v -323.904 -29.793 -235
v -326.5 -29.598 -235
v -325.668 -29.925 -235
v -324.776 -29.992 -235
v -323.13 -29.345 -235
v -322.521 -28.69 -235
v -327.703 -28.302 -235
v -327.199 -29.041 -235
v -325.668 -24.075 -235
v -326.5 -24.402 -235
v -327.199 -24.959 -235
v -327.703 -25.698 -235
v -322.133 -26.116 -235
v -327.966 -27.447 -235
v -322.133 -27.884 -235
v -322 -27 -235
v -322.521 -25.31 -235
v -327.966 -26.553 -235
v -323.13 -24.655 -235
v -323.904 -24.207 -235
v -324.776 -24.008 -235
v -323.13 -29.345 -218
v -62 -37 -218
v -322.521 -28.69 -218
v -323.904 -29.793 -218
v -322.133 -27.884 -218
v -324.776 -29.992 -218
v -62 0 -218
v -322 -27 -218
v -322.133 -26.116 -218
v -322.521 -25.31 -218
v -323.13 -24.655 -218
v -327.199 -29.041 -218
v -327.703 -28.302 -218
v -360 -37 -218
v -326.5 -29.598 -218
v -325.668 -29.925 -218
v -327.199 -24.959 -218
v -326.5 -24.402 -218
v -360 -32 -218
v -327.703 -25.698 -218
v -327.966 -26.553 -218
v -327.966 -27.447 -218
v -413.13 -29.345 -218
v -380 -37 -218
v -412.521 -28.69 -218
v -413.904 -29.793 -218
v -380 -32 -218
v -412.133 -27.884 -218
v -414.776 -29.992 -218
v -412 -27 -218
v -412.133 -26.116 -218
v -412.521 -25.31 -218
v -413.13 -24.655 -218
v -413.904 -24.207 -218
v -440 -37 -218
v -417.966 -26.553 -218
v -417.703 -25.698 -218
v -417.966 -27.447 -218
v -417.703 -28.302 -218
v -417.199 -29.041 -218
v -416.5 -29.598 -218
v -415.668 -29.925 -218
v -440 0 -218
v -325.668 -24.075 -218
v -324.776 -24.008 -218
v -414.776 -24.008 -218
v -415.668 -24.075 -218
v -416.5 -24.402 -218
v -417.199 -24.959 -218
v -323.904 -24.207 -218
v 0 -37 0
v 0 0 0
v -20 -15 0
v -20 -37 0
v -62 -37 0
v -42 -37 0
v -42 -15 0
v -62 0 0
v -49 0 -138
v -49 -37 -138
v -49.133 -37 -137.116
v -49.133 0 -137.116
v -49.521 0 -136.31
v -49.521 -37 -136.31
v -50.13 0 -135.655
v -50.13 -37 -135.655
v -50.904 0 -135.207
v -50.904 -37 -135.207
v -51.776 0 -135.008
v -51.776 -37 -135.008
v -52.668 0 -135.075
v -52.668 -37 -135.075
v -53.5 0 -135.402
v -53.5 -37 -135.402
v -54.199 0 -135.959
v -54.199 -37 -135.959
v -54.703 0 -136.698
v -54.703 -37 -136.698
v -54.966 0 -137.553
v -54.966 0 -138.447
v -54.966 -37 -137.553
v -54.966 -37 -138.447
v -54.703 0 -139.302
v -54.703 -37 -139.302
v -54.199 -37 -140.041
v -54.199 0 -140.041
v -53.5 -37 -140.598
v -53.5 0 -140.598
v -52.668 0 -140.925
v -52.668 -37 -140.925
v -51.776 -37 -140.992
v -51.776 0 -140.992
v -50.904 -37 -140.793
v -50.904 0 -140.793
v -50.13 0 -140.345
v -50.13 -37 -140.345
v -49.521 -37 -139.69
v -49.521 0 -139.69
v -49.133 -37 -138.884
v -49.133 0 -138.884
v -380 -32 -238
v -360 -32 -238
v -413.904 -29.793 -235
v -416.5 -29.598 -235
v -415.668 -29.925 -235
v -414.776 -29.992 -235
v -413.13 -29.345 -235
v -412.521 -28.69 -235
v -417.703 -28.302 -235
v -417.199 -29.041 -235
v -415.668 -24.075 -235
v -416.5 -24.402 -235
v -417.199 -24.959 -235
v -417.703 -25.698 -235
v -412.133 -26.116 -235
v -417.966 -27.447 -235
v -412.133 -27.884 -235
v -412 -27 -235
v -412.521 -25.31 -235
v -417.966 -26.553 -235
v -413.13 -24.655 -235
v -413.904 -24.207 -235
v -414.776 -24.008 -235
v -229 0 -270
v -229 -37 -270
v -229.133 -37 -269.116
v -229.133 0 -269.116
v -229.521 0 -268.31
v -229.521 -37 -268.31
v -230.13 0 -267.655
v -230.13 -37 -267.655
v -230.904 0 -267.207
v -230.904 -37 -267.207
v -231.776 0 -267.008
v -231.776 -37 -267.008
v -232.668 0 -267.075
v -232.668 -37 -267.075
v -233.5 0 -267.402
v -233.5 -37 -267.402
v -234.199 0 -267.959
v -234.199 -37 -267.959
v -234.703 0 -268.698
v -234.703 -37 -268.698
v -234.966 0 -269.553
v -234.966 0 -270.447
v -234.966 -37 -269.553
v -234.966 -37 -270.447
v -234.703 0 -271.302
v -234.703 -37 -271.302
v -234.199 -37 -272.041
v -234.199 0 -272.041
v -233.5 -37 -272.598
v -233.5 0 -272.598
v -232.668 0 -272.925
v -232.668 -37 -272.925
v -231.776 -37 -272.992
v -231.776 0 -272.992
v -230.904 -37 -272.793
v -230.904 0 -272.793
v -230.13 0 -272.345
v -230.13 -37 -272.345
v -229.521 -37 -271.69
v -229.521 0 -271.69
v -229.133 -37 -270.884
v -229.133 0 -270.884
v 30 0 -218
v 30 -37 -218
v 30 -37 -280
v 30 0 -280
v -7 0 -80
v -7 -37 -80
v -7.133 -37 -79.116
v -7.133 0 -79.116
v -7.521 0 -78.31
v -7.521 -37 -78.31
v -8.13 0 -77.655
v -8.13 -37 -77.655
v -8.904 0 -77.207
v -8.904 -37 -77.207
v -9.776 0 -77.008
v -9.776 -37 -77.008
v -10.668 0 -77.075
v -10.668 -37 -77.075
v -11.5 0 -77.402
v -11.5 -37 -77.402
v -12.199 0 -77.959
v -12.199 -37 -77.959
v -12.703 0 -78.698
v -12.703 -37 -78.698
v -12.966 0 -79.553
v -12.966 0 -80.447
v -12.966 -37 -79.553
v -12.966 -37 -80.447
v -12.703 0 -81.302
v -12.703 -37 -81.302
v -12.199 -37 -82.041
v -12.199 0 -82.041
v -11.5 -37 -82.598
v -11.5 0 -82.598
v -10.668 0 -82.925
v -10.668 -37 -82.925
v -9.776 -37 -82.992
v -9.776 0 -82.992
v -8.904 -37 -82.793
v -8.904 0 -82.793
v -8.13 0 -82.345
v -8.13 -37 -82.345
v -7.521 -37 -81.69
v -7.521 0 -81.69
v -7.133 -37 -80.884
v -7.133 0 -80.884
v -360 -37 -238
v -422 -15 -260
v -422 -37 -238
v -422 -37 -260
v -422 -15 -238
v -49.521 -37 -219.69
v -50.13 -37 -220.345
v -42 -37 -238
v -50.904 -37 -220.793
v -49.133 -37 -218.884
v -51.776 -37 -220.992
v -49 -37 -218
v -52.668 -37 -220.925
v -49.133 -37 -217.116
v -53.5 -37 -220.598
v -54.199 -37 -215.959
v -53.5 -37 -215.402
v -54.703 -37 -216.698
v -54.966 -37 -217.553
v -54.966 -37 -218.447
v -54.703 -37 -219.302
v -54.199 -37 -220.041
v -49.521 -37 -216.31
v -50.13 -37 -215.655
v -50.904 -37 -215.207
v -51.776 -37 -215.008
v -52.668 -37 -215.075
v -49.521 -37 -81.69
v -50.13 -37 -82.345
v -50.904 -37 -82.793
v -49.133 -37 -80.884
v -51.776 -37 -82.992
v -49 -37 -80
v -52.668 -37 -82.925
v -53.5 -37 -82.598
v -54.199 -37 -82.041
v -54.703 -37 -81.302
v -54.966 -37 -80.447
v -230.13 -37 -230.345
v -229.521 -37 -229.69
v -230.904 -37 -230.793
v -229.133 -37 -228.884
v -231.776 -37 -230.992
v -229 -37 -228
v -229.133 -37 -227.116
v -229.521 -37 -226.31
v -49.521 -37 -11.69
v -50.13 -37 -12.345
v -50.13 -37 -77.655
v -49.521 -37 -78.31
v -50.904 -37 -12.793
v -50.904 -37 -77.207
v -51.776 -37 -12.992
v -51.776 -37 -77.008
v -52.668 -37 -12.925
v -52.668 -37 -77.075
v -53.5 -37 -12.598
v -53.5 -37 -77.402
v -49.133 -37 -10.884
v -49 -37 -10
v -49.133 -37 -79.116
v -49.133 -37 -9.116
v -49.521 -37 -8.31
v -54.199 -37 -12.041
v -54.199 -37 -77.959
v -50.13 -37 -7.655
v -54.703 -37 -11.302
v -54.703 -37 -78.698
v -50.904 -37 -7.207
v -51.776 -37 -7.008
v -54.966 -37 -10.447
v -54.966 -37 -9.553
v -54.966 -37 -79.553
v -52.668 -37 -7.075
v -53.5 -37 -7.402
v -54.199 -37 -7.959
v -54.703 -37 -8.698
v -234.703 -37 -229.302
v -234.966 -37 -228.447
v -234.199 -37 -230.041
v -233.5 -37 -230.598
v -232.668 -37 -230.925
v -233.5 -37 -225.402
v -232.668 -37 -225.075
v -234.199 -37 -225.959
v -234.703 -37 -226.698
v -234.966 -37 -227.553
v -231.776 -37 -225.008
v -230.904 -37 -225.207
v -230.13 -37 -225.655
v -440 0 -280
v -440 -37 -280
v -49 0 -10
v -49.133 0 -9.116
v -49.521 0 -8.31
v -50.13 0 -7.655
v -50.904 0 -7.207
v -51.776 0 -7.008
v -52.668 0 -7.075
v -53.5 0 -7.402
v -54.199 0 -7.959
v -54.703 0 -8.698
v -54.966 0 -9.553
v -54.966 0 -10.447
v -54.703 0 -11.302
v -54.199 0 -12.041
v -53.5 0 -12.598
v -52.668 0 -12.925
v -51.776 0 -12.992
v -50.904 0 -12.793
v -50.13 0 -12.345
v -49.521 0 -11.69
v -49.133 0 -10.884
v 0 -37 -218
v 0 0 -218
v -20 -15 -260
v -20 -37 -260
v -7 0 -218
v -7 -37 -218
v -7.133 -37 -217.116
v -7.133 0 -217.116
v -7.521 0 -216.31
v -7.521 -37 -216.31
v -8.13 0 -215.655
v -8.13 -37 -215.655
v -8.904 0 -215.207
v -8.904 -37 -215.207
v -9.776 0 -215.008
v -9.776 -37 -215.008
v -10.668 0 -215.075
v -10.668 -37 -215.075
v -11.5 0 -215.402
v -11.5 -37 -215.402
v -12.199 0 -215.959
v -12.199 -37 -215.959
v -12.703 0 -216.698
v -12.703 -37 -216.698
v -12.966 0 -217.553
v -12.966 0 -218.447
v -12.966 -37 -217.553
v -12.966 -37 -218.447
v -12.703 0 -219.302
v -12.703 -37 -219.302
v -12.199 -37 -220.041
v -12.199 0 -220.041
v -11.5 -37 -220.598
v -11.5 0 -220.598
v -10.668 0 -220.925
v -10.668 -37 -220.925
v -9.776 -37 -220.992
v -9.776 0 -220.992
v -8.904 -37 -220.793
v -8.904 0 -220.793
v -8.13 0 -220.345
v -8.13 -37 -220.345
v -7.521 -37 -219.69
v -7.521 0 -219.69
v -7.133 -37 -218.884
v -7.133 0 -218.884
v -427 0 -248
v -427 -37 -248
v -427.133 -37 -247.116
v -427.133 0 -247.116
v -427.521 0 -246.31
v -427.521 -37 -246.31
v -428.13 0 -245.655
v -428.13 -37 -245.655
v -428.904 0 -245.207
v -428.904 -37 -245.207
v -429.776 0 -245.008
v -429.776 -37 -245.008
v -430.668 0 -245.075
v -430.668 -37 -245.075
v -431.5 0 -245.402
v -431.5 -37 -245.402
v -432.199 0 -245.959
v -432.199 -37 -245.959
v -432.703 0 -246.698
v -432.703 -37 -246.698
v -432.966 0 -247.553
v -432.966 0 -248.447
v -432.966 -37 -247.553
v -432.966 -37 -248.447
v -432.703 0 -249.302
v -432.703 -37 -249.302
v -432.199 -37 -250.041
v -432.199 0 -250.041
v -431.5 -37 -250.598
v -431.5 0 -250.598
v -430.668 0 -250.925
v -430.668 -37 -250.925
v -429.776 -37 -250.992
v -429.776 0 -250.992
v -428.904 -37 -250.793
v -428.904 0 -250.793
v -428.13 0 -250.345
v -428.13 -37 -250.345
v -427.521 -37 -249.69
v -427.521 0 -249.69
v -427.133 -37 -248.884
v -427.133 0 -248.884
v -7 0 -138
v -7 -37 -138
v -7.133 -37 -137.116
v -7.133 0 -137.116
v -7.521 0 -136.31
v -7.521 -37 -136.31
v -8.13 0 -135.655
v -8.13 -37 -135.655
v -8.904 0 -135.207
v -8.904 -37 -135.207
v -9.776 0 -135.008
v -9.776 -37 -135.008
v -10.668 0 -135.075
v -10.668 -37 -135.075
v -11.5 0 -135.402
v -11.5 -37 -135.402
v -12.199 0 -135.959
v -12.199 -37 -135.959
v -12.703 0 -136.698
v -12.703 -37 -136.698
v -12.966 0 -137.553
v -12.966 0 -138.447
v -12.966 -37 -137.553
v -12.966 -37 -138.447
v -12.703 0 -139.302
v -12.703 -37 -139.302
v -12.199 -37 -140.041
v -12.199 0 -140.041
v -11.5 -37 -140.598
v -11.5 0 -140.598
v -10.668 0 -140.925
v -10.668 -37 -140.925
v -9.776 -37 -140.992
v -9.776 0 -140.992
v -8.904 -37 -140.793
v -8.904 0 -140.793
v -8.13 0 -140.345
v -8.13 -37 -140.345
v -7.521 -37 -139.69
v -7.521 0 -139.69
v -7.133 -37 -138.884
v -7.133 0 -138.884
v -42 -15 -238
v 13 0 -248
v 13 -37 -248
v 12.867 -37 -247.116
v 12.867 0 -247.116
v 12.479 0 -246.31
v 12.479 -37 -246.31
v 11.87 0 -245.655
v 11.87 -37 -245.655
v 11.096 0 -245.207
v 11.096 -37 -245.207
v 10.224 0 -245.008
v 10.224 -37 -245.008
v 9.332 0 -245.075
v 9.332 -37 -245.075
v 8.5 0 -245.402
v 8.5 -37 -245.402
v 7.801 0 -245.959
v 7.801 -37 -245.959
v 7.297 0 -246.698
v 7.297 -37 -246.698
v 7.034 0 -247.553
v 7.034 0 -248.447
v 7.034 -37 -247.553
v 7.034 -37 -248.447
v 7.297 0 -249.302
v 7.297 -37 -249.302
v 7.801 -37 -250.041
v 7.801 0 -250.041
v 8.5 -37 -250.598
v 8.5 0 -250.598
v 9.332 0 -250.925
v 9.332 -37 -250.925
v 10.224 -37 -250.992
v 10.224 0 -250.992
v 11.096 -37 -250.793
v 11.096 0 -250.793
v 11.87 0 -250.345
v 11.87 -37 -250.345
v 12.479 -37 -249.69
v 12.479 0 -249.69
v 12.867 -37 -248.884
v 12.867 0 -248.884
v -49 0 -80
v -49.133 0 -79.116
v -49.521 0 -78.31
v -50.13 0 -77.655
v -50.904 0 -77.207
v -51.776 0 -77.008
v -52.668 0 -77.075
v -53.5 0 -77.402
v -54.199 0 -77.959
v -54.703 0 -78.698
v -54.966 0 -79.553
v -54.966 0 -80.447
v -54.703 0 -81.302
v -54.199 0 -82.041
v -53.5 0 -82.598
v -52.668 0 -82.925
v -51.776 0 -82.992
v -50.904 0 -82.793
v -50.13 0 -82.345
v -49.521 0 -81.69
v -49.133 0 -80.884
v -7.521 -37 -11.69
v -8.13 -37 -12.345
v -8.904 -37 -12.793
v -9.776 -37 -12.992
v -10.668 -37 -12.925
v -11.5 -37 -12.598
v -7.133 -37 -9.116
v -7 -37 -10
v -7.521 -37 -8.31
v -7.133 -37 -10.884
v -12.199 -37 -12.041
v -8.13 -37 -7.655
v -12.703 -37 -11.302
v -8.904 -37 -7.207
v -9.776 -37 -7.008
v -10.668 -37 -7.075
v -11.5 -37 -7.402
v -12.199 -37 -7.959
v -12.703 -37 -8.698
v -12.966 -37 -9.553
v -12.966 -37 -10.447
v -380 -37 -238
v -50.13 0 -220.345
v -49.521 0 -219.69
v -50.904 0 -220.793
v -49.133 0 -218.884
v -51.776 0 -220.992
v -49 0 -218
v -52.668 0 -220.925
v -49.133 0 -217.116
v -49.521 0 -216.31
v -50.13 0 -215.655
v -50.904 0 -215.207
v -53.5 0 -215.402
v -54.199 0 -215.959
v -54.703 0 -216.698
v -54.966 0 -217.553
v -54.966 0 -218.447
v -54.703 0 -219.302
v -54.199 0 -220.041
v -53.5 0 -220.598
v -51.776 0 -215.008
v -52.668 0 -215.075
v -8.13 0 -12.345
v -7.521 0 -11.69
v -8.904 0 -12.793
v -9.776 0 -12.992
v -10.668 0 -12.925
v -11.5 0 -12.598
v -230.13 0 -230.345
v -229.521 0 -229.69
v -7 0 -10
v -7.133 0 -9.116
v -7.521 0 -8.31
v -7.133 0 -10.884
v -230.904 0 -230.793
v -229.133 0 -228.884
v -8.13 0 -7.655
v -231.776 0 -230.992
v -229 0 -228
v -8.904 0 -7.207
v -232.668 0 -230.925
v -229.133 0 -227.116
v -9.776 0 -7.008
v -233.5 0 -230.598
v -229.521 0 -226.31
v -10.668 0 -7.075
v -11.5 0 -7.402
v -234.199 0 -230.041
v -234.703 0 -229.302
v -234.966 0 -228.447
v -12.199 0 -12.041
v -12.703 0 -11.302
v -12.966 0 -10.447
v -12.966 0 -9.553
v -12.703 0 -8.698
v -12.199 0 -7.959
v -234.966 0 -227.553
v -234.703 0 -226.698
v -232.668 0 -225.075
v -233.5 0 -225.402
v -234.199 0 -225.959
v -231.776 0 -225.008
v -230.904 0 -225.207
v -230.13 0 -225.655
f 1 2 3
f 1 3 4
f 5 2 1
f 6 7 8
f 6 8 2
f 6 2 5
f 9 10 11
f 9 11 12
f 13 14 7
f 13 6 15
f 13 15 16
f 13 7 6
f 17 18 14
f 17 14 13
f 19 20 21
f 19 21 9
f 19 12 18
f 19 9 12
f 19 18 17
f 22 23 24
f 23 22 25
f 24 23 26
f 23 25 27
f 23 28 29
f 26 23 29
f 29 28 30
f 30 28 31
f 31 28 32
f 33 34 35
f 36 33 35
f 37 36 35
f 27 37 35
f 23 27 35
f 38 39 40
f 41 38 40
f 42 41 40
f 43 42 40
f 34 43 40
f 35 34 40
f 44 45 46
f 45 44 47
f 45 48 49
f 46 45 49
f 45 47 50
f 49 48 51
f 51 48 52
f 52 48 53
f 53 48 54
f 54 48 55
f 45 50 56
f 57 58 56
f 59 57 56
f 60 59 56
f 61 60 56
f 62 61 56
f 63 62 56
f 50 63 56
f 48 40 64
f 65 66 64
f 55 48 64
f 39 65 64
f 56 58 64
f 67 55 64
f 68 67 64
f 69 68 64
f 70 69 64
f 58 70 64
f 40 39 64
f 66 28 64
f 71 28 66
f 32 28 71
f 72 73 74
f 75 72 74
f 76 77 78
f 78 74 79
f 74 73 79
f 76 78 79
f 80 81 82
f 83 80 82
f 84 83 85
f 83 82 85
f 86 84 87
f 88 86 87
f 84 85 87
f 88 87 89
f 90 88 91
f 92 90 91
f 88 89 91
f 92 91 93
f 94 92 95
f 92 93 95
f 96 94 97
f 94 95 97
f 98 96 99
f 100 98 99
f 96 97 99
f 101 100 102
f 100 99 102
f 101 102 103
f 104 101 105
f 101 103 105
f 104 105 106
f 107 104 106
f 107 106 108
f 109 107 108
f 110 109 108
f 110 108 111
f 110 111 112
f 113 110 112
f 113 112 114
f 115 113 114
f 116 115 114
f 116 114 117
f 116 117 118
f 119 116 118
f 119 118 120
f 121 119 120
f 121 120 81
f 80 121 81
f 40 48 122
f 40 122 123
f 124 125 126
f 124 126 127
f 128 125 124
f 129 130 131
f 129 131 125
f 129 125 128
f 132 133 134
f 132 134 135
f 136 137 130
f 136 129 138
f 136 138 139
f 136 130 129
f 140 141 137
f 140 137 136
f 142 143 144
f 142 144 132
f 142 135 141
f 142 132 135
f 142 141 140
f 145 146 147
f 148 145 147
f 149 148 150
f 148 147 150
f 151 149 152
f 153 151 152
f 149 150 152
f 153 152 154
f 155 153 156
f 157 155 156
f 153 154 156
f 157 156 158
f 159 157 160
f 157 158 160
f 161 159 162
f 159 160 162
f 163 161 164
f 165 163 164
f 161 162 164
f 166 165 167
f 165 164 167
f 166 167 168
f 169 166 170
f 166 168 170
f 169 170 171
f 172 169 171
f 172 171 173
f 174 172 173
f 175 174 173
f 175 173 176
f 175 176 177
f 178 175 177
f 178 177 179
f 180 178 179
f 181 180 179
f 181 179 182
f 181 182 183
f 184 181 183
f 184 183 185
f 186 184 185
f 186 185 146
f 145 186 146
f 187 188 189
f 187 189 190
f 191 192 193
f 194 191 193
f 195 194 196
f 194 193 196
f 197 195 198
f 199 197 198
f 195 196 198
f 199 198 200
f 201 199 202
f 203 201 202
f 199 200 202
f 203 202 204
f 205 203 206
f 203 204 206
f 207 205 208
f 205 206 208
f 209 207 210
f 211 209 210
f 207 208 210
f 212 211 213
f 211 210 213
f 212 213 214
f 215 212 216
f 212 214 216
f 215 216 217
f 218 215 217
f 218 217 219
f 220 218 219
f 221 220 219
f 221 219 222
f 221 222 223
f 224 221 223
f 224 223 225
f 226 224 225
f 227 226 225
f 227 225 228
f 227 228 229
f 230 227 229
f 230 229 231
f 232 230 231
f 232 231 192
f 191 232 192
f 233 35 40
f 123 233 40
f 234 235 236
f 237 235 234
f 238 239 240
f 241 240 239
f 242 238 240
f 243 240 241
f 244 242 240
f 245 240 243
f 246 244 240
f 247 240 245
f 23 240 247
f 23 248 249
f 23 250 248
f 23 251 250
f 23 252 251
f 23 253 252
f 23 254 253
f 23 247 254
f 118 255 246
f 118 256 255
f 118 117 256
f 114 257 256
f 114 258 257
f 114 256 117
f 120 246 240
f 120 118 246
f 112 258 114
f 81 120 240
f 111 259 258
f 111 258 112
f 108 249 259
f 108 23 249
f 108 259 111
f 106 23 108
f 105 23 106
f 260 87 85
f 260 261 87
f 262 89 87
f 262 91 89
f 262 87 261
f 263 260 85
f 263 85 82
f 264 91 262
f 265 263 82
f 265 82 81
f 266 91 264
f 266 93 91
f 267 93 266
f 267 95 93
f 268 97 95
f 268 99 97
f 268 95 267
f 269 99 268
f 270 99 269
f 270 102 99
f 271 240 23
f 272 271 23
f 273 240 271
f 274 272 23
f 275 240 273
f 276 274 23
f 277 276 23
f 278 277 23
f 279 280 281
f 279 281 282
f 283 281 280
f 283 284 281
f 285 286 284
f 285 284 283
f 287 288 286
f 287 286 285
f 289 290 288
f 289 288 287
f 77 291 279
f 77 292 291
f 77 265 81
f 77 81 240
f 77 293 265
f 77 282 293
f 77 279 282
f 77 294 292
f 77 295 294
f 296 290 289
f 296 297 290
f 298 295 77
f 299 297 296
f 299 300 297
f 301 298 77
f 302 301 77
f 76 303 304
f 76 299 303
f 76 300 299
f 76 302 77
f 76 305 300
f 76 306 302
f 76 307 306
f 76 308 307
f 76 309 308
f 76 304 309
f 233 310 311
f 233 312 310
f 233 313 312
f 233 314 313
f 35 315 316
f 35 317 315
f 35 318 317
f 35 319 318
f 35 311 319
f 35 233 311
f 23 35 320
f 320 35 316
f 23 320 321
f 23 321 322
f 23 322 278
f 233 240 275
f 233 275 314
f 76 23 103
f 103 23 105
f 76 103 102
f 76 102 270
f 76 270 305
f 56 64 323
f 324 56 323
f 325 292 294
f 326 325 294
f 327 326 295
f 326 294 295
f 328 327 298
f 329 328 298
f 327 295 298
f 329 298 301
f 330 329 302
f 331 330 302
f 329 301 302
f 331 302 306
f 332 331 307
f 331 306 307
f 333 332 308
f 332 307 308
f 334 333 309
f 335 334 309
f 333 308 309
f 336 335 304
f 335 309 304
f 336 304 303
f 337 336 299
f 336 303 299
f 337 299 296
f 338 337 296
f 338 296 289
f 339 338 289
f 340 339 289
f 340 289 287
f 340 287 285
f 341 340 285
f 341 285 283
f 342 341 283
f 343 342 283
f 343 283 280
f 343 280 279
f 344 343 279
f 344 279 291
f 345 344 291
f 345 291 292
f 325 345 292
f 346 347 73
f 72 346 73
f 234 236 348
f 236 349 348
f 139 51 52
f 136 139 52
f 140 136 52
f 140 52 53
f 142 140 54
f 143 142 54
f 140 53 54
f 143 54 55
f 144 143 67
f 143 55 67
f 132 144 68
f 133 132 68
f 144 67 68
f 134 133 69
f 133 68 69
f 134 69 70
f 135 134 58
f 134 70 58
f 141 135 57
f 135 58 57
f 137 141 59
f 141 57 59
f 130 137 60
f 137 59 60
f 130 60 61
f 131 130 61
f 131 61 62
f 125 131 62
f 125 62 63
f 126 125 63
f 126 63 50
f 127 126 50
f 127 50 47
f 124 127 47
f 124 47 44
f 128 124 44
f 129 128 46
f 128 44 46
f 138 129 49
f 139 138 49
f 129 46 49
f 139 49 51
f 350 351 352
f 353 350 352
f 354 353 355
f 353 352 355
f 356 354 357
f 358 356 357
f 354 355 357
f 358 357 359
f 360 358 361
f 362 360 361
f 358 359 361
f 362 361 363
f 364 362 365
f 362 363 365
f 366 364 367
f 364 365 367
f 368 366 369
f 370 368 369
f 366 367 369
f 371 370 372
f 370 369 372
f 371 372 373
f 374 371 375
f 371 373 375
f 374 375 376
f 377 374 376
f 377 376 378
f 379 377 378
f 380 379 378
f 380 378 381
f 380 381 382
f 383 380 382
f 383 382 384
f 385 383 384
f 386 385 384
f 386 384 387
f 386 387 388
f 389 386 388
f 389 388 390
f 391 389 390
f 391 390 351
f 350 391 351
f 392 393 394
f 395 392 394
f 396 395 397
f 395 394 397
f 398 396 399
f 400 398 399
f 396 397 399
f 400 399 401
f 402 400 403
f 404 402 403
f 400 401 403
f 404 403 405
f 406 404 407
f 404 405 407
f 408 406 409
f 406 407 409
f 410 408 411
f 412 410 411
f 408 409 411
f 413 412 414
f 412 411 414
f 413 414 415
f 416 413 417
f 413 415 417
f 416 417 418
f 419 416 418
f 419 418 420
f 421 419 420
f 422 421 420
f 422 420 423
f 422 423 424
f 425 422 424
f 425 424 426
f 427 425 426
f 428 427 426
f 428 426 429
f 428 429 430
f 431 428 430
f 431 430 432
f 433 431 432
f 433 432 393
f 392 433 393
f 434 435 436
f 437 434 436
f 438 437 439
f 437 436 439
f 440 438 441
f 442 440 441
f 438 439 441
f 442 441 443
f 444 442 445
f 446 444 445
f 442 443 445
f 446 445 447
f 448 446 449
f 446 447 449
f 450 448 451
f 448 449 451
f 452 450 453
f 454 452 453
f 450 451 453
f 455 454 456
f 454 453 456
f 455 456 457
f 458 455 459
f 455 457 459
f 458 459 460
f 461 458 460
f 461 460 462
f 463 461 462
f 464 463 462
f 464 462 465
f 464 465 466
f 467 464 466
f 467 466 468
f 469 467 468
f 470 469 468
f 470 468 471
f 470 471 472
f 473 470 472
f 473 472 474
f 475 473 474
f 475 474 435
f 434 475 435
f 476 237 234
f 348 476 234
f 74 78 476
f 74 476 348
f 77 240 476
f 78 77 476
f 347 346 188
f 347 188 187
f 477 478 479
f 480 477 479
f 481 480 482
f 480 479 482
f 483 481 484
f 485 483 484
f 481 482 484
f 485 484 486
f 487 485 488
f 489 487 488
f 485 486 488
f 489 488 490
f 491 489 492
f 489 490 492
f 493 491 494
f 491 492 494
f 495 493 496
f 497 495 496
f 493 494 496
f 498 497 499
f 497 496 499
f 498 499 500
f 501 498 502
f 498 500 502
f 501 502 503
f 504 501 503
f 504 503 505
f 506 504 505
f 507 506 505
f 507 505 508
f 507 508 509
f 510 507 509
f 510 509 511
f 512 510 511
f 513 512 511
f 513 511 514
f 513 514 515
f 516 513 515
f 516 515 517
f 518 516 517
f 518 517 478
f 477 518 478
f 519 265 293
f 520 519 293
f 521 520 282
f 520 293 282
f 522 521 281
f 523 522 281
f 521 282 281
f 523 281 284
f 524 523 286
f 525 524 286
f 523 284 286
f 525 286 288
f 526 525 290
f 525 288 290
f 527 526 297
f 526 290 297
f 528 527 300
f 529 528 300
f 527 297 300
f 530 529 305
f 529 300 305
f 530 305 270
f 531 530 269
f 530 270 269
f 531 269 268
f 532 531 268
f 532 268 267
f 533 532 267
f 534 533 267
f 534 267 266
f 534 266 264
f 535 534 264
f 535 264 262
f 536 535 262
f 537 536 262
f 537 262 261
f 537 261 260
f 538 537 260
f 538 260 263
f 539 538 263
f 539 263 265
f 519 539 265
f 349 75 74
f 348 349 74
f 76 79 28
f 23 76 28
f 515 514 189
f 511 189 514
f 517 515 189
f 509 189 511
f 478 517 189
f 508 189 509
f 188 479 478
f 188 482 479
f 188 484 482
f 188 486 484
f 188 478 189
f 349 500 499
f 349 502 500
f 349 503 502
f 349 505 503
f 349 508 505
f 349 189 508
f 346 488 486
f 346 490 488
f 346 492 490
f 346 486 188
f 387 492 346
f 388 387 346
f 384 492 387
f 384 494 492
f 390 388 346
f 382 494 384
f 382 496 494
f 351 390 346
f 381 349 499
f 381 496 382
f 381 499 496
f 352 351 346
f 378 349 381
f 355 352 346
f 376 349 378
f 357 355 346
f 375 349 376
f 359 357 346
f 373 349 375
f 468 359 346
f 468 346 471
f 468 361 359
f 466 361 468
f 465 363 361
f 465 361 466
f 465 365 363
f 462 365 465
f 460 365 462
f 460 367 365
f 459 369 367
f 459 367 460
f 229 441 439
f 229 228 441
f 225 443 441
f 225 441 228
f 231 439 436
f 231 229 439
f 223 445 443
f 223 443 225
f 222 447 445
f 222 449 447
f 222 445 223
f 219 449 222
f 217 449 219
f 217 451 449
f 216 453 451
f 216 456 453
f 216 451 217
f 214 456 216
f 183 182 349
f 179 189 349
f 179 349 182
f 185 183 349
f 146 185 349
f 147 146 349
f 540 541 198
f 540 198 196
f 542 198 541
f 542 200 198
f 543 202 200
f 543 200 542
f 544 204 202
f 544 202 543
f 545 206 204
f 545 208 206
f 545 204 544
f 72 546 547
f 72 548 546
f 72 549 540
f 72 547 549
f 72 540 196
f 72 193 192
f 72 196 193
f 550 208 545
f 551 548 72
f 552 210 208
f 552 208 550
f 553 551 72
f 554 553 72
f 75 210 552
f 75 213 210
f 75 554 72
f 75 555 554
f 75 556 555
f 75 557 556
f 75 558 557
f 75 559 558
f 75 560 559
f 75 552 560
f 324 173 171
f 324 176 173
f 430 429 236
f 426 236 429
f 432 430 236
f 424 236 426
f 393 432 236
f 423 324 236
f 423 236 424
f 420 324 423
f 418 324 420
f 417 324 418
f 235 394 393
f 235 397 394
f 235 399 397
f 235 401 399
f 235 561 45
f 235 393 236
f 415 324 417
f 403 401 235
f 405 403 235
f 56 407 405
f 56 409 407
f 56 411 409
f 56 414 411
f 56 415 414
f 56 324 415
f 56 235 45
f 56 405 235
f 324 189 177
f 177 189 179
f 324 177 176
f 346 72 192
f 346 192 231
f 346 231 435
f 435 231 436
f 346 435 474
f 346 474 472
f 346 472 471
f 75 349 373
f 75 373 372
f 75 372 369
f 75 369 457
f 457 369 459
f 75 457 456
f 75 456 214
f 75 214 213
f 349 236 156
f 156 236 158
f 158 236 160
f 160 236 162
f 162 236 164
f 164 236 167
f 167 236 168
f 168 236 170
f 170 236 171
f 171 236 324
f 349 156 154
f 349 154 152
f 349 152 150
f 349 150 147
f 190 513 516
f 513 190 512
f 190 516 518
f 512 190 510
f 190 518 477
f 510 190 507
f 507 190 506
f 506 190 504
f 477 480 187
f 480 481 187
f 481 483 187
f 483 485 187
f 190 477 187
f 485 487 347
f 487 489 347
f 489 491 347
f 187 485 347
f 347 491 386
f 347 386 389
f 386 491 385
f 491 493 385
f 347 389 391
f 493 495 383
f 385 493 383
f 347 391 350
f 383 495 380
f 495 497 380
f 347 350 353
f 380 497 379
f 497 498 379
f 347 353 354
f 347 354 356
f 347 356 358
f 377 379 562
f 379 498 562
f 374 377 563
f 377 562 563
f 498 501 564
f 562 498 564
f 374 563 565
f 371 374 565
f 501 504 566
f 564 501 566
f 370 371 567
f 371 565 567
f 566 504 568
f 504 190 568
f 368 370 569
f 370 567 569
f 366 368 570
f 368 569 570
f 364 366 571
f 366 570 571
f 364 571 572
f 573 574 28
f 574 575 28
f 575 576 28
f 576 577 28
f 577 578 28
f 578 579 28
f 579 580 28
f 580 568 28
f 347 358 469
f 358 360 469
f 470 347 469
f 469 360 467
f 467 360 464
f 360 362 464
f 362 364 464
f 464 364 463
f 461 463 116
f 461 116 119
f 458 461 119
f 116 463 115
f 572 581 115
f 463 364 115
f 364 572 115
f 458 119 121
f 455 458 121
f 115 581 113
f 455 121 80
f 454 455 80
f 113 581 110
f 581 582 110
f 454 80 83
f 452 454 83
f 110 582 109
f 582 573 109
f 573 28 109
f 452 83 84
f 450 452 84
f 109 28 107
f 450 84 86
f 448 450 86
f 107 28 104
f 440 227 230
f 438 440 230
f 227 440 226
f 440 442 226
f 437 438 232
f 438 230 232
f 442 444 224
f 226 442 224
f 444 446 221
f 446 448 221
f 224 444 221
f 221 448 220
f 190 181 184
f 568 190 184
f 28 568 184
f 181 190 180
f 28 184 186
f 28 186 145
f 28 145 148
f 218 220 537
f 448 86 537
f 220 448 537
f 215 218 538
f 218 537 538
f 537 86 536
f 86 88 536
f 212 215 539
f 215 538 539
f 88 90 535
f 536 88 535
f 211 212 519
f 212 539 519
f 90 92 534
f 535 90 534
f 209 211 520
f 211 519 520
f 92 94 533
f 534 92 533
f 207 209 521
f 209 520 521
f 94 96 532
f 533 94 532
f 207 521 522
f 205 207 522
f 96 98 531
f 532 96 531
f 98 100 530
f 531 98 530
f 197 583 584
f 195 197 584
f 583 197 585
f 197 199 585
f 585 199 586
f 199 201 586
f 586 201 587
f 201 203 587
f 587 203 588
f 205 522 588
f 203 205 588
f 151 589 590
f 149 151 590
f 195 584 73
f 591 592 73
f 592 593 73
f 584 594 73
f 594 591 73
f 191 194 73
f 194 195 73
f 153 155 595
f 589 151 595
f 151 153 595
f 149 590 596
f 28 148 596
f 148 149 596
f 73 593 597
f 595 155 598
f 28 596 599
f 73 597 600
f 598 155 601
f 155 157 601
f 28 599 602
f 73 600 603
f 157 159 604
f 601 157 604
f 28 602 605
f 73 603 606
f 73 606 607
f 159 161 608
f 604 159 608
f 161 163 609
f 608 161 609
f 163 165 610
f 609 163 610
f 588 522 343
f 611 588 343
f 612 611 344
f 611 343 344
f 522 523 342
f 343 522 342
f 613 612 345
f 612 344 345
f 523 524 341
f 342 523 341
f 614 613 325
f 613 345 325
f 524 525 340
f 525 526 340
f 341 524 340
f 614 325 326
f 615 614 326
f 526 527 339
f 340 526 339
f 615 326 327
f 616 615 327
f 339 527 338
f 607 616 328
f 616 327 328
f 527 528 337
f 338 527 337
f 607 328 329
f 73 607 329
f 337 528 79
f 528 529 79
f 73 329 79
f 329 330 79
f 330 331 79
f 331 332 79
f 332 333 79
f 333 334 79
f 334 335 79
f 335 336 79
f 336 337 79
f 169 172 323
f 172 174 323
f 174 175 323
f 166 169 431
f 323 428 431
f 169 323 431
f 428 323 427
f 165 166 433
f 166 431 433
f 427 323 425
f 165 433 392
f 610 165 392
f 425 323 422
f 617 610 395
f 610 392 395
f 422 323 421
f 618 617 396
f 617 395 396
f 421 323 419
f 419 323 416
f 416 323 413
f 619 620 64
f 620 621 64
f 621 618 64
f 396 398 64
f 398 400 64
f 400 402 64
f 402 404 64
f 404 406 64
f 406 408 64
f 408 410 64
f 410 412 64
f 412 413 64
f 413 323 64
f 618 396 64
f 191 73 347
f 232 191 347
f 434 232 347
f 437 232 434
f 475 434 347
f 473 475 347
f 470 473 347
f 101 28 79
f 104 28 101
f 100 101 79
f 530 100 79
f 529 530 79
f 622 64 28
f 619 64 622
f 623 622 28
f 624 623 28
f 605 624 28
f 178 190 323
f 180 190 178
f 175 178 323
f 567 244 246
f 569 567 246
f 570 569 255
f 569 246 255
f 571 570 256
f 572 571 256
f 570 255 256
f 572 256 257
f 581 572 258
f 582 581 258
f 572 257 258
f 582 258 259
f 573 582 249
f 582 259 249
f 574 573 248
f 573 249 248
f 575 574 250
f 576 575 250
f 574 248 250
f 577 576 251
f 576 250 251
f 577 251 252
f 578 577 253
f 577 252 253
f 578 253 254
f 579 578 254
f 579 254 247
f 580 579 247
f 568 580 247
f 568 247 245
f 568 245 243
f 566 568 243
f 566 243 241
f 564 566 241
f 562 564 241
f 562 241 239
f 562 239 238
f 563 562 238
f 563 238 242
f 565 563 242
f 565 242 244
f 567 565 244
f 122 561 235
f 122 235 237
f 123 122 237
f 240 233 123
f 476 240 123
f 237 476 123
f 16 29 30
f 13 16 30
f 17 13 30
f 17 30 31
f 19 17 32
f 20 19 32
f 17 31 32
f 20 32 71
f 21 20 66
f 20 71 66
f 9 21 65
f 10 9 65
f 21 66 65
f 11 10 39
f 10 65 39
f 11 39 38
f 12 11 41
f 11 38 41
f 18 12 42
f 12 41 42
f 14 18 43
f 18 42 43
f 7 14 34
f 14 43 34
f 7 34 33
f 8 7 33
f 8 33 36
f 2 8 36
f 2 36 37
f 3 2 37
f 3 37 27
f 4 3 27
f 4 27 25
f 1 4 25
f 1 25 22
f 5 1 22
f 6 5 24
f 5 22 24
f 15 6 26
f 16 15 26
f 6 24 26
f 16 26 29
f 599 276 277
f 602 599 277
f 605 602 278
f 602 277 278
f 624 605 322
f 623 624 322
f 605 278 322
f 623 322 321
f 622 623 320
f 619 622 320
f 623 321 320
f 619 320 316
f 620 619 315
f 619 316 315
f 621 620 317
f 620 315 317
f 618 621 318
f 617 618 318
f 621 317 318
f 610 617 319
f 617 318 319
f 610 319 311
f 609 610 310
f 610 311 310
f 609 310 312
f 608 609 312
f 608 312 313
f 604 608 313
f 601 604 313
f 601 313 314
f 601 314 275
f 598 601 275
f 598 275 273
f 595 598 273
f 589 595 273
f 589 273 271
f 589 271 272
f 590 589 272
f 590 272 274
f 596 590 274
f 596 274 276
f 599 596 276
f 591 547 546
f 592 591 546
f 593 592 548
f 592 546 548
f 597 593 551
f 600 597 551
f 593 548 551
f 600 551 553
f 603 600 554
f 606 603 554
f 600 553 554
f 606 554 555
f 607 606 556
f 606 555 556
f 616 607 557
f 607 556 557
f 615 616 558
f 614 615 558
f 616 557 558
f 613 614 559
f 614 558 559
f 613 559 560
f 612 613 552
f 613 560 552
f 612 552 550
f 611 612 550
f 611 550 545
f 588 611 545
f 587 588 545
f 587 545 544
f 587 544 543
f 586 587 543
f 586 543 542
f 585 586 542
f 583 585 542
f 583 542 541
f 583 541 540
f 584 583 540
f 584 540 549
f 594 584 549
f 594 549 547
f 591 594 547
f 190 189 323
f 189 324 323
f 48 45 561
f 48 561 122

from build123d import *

# Parameters (mm, degrees)
F1_DEPTH  = 37
F2_W      = 22
F2_H      = 22
F3_DEPTH  = 260
F4_W      = 37
F4_H      = 62
F5_DEPTH  = 30
F6_W      = 22
F6_H      = 22
F7_DEPTH  = 380
F8_W      = 20
F8_H      = 5
F9_DEPTH  = 25
F10_R     = 3
F11_DEPTH = 37.001
F13_R     = 3
F14_DEPTH = 17


with BuildPart() as f1:
    # F0 (on Front) → F1 (new body)
    with BuildSketch(Plane.XZ):
        Polygon((0, -280), (0, 0), (-62, 0), (-62, -218), (-440, -218), (-440, -280), align=None)
    extrude(amount=F1_DEPTH)

    # F2 (on face) → F3 (cut)
    with BuildSketch(Plane.XY):
        with Locations((-31, -26)):
            Rectangle(F2_W, F2_H)
    extrude(amount=-F3_DEPTH, mode=Mode.SUBTRACT)

    # F4 (on face) → F5 (join)
    with BuildSketch(Plane.YZ):
        with Locations((-18.5, -249)):
            Rectangle(F4_W, F4_H)
    extrude(amount=F5_DEPTH)

    # F6 (on face) → F7 (cut)
    with BuildSketch(Plane.YZ.offset(-42)):
        with Locations((-26, -249)):
            Rectangle(F6_W, F6_H)
    extrude(amount=-F7_DEPTH, mode=Mode.SUBTRACT)

    # F8 (on face) → F9 (cut)
    with BuildSketch(Plane.XY.offset(-218)):
        with Locations((-370, -34.5)):
            Rectangle(F8_W, F8_H)
    extrude(amount=-F9_DEPTH, mode=Mode.SUBTRACT)

    # F10 (on face) → F11 (cut, through all)
    with BuildSketch(Plane.XZ.offset(37)):
        with Locations((-52, -10)):
            Circle(F10_R)
        with Locations((-10, -10)):
            Circle(F10_R)
        with Locations((-52, -80)):
            Circle(F10_R)
        with Locations((-10, -80)):
            Circle(F10_R)
        with Locations((-52, -138)):
            Circle(F10_R)
        with Locations((-10, -138)):
            Circle(F10_R)
        with Locations((-52, -218)):
            Circle(F10_R)
        with Locations((-10, -218)):
            Circle(F10_R)
        with Locations((10, -248)):
            Circle(F10_R)
        with Locations((-232, -270)):
            Circle(F10_R)
        with Locations((-232, -228)):
            Circle(F10_R)
        with Locations((-430, -248)):
            Circle(F10_R)
    extrude(amount=-F11_DEPTH, mode=Mode.SUBTRACT)

    # F13 (on face) → F14 (cut)
    with BuildSketch(Plane.XY.offset(-218)):
        with Locations((-415, -27)):
            Circle(F13_R)
        with Locations((-325, -27)):
            Circle(F13_R)
    extrude(amount=-F14_DEPTH, mode=Mode.SUBTRACT)


solid = f1.part
